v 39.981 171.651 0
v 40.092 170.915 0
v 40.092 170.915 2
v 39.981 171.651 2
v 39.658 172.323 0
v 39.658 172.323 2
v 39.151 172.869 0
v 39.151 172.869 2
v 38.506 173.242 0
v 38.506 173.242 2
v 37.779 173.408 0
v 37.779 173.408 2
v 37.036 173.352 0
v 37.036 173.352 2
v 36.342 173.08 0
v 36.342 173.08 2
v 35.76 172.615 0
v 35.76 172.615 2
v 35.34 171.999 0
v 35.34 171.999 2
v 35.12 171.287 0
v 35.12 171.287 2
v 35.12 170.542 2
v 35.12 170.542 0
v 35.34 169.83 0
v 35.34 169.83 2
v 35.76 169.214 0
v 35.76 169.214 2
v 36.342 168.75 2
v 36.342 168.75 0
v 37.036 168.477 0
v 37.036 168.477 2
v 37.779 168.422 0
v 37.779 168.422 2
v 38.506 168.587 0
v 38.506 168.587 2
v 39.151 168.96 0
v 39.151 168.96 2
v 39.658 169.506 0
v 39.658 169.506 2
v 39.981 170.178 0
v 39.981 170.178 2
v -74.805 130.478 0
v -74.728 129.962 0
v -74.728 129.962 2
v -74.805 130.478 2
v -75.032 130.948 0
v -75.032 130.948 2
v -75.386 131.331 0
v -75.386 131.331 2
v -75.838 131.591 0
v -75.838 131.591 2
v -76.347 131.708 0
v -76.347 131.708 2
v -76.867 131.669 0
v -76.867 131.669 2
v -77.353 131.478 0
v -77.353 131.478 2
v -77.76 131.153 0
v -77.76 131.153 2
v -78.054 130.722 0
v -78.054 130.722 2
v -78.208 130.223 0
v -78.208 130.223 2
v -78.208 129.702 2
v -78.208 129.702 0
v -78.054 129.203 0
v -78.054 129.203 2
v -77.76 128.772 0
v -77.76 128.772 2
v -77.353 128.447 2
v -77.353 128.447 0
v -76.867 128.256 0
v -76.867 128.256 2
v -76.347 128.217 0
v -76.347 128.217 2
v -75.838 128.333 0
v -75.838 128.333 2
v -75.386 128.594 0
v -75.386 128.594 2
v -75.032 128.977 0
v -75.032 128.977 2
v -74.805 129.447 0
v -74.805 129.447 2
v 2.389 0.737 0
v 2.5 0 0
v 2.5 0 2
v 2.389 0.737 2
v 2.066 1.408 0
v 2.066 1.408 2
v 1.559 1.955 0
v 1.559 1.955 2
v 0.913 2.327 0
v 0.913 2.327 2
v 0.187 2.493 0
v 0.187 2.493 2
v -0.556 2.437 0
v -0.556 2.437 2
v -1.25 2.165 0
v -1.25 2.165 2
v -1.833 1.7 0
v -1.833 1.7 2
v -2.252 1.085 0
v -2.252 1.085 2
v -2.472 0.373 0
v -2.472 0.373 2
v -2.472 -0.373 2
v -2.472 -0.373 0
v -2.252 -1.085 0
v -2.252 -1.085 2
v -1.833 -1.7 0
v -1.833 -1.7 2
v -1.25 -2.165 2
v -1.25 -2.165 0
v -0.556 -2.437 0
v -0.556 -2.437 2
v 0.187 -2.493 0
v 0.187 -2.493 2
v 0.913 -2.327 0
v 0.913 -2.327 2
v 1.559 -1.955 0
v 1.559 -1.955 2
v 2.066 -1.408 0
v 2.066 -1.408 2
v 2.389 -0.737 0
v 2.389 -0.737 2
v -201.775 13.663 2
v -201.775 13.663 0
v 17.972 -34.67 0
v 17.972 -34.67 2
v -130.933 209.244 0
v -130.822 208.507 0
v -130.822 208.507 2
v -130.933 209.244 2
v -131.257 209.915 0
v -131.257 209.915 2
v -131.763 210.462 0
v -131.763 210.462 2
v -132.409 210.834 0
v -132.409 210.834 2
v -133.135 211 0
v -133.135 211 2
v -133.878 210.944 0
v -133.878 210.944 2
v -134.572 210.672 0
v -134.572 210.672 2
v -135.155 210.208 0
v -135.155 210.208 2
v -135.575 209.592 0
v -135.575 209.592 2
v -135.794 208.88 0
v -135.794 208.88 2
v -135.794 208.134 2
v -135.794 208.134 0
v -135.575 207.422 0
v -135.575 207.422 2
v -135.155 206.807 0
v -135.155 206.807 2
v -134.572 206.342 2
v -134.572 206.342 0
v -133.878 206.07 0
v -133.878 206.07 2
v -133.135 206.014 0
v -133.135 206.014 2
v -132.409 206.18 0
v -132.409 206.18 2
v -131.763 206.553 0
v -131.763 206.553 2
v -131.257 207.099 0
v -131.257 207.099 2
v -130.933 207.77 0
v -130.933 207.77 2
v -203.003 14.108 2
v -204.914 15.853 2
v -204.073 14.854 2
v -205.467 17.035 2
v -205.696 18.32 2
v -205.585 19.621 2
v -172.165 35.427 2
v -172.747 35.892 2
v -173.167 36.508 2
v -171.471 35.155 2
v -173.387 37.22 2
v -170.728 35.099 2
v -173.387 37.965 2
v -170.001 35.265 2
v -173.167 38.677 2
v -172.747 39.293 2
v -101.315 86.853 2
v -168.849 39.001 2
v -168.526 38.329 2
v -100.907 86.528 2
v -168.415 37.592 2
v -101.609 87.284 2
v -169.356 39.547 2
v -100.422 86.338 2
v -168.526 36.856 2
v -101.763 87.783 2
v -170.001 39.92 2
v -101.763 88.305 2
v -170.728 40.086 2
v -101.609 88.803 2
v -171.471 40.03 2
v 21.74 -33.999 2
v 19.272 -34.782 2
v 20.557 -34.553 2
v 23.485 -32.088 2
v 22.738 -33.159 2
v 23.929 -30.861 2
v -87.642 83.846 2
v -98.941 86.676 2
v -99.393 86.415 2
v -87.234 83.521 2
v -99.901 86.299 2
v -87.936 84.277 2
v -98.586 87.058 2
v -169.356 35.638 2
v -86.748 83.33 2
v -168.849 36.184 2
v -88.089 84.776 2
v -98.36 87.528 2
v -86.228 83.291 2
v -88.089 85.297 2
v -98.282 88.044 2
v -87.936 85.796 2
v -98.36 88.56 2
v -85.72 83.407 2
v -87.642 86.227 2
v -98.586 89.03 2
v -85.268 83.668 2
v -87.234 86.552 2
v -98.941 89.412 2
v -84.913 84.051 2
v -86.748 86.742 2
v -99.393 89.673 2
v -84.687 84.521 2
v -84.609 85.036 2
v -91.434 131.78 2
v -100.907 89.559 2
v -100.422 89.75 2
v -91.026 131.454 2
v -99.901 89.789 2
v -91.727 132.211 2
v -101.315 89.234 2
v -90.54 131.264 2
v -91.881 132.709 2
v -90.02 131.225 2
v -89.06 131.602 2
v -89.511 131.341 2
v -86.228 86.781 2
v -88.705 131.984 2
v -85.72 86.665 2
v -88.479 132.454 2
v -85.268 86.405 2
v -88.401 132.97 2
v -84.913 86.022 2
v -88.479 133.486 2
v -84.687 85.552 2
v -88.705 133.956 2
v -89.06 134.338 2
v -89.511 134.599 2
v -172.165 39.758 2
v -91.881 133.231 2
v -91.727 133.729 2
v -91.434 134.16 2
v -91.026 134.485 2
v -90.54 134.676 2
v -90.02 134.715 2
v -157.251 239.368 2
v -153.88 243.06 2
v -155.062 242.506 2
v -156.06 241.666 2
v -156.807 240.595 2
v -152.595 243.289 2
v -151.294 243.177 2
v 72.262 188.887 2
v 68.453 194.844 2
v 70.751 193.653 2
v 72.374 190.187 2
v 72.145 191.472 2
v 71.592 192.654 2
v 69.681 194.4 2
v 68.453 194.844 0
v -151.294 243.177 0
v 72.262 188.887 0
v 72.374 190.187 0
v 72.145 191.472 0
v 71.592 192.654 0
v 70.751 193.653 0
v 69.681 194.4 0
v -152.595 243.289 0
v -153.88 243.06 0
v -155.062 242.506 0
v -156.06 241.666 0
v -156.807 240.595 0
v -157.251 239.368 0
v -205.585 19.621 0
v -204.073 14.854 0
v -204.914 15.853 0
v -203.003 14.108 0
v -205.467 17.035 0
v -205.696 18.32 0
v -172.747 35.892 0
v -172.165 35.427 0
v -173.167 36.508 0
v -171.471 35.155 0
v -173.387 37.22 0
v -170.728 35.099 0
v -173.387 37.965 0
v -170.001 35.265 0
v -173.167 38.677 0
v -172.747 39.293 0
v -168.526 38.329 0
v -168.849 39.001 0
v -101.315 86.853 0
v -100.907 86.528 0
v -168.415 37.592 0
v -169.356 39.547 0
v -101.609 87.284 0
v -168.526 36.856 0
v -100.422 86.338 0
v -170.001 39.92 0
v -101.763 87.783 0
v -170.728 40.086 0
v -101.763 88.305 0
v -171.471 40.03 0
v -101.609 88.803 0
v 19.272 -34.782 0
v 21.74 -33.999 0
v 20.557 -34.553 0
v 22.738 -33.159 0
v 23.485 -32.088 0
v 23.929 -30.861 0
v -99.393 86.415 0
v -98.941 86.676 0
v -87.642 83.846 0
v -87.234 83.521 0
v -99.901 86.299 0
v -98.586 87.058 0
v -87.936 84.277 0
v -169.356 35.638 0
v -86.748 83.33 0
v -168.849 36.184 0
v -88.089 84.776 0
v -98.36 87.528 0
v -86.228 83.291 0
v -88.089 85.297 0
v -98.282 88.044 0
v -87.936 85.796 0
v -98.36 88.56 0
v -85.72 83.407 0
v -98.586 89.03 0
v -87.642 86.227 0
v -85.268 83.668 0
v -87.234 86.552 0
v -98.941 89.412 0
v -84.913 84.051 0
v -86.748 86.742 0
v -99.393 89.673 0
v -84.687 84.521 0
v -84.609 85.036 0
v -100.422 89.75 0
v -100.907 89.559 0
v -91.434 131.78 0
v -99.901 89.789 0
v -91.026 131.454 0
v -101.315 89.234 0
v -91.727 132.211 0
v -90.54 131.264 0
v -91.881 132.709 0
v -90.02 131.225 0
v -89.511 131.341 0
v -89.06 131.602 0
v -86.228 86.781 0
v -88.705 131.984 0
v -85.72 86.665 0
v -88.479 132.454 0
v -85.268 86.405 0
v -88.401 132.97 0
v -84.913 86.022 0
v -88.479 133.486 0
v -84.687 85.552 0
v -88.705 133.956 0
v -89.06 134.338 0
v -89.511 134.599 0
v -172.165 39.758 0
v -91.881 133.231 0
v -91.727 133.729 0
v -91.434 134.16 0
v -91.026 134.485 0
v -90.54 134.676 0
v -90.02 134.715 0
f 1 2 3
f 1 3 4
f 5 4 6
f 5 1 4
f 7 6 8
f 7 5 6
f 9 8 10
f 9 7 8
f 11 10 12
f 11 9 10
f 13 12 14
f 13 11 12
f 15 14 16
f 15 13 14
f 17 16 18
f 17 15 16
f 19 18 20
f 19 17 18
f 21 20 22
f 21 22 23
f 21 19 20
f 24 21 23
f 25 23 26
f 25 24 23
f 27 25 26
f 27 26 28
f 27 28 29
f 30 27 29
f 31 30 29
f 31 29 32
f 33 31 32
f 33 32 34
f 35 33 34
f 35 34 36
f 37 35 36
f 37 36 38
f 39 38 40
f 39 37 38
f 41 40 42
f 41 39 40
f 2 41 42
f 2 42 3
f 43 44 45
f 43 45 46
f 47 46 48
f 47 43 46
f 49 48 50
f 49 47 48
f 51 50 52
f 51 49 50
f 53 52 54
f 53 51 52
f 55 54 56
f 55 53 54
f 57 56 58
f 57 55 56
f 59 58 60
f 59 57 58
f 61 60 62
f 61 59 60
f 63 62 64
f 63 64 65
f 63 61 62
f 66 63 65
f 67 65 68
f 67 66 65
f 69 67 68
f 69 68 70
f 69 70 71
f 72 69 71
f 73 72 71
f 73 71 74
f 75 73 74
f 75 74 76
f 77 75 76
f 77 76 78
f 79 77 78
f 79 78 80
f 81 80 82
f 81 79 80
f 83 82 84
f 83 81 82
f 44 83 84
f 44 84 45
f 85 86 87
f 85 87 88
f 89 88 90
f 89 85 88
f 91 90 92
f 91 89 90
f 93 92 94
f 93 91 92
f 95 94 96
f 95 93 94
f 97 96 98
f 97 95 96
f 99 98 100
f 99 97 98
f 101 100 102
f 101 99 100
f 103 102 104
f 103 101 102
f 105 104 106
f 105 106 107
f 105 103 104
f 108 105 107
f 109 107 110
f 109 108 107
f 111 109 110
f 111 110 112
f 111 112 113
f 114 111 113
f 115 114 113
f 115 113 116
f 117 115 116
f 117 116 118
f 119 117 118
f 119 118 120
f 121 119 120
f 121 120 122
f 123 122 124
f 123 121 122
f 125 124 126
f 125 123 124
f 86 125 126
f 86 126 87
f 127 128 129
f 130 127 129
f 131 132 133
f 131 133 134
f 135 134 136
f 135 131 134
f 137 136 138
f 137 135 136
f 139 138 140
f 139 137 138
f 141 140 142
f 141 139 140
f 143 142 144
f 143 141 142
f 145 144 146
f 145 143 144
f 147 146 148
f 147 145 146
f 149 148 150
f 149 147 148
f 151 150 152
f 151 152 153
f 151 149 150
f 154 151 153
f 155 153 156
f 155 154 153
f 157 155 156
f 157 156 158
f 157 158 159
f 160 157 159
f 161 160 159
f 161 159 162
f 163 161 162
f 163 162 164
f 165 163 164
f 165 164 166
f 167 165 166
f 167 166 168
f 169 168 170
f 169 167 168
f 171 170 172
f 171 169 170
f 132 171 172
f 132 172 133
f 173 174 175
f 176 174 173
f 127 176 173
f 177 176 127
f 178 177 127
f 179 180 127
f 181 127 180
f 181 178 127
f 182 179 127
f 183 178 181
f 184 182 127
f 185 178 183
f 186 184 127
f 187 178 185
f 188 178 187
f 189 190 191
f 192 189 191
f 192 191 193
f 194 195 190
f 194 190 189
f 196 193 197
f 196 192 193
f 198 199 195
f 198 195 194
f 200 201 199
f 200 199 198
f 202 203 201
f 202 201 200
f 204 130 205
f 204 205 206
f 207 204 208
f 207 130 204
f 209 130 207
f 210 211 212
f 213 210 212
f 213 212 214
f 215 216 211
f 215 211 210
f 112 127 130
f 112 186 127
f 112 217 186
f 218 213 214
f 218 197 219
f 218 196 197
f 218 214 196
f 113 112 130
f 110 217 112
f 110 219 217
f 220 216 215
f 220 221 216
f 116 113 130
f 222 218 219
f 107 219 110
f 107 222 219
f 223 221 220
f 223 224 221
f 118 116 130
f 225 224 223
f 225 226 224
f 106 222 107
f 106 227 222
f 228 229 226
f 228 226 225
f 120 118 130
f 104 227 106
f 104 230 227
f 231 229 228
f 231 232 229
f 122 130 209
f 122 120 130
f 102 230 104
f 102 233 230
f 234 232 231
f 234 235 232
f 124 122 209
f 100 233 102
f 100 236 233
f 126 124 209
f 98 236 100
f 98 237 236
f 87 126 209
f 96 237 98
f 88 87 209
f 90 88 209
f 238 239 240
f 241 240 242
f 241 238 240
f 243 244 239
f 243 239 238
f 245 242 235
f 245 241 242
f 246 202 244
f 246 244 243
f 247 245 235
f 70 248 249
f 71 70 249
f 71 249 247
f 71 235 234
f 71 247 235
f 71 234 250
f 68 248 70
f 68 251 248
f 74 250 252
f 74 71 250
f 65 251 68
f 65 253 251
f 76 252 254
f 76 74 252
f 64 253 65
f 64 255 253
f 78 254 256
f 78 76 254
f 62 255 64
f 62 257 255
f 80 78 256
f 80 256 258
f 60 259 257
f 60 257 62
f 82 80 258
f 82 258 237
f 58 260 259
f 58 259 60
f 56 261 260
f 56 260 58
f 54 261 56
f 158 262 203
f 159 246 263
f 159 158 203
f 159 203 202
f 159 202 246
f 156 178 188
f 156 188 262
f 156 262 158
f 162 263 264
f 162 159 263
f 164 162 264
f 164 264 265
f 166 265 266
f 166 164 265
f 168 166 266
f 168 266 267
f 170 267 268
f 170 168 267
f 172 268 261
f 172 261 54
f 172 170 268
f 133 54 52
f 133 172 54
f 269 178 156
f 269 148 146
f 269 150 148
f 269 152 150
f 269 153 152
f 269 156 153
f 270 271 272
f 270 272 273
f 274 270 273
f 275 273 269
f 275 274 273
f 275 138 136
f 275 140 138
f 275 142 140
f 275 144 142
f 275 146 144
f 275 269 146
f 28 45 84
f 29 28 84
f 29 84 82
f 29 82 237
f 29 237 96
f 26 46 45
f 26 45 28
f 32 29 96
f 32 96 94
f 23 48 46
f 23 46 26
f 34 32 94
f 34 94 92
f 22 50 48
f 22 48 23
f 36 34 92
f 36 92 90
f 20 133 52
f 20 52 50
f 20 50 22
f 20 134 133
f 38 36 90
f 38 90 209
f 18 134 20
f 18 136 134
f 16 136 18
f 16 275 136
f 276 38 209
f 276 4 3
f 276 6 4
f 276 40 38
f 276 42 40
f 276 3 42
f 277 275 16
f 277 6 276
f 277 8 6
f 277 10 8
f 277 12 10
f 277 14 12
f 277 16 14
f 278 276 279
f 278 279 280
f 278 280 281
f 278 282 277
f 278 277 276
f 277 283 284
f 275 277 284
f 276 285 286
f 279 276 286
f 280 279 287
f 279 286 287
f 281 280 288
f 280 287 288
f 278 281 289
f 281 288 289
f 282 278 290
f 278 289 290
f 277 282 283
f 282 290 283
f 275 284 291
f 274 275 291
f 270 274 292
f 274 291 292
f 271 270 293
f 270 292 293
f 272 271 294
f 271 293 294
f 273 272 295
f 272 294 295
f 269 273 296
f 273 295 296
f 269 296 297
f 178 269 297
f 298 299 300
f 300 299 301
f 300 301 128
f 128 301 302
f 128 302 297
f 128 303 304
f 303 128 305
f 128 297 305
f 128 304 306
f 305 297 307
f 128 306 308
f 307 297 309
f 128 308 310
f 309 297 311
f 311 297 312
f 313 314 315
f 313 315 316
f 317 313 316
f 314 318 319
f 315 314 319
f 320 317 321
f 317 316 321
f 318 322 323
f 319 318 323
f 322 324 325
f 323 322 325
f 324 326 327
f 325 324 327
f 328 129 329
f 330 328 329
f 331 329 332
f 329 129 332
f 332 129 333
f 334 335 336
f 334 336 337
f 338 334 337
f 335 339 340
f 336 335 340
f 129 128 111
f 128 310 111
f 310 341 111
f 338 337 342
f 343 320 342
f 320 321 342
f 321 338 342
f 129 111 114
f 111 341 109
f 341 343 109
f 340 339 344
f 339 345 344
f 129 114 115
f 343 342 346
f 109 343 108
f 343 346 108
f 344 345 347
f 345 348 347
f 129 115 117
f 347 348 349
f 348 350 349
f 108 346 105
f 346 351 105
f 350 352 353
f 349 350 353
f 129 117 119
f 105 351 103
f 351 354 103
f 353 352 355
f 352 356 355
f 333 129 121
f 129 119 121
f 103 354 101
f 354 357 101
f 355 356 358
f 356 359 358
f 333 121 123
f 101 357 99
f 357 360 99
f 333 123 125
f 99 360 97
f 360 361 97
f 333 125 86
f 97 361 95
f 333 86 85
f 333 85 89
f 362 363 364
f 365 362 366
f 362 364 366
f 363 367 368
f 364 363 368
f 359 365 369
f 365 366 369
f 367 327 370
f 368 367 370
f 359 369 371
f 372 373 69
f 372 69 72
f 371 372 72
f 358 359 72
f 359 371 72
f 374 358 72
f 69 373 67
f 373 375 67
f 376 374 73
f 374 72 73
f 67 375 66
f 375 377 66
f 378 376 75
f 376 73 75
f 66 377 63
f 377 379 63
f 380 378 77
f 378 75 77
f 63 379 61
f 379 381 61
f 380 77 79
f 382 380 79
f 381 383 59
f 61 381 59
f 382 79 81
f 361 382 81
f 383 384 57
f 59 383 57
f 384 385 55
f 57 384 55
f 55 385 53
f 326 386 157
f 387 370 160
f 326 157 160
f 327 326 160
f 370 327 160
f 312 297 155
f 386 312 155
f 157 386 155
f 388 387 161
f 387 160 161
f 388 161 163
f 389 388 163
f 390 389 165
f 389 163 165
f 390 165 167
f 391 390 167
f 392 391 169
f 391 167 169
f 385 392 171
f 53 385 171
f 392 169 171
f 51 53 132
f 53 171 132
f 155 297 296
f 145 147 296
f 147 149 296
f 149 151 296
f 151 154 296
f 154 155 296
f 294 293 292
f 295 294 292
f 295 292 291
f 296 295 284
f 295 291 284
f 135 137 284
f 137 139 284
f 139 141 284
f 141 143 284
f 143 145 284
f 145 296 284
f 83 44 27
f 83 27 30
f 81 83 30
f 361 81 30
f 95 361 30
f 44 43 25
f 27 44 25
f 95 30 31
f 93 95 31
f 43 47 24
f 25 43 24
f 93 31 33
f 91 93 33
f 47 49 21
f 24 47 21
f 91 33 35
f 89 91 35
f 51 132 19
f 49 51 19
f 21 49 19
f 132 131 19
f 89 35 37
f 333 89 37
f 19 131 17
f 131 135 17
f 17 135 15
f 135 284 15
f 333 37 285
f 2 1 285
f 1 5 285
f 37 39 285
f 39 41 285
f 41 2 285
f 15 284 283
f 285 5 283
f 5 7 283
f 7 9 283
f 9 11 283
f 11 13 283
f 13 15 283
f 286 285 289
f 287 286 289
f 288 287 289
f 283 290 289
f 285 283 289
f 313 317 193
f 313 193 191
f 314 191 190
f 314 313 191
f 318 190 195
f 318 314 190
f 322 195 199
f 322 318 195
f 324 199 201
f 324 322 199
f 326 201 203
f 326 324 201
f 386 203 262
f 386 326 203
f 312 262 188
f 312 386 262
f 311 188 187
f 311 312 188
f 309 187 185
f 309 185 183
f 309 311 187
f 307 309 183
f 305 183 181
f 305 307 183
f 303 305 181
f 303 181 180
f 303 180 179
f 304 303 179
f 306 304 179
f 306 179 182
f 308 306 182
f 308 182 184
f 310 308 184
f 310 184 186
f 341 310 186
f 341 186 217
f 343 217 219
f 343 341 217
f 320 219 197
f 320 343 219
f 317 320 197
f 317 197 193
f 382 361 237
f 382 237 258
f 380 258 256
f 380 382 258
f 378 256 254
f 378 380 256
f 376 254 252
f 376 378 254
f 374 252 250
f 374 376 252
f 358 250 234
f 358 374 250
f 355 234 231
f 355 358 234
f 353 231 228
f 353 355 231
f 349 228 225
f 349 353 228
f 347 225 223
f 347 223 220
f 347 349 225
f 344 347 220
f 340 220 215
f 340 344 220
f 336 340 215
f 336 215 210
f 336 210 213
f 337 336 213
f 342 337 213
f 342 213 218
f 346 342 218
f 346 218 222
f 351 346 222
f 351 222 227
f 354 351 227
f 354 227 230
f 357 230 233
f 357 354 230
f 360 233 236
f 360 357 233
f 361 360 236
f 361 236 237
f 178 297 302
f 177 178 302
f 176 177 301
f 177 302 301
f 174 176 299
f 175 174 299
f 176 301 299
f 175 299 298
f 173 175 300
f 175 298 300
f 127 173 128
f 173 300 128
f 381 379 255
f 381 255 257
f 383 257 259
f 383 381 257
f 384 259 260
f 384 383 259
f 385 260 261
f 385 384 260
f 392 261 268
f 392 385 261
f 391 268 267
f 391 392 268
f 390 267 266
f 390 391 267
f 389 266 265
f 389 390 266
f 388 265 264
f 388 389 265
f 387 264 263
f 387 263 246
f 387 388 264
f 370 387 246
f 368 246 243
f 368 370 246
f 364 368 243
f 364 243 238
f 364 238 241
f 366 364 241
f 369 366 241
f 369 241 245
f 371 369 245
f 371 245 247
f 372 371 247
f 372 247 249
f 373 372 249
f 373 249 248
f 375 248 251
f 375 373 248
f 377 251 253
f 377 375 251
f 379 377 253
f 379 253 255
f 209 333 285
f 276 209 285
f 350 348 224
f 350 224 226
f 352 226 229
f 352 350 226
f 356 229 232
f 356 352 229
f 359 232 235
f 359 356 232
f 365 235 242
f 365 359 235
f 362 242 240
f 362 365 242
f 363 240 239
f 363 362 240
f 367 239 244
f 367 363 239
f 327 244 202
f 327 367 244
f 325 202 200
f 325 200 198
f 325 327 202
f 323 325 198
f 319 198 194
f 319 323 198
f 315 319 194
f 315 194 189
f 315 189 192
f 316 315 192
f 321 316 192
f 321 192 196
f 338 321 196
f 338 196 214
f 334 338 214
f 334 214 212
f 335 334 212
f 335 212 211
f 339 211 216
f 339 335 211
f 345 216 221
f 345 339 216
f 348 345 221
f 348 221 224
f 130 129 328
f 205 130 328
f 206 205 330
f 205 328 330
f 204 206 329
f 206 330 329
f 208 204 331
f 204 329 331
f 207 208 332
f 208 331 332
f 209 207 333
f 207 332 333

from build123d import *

# Parameters (mm, degrees)
ESQUISSE1_R        = 2.5
ESQUISSE1_R_2      = 1.75
BOSS_EXTRU_1_DEPTH = 2


with BuildPart() as part:
    # Esquisse1 → Boss.-Extru.1 (new body)
    with BuildSketch(Plane.XY):
        with BuildLine():
            Line((-201.77541219, 13.663200047), (17.971945957, -34.670003728))
            ThreePointArc((17.971945957, -34.670003728), (21.739530729, -33.99920873), (23.929291778, -30.860800298))
            Line((23.929291778, -30.860800298), (72.262495553, 188.88655785))
            ThreePointArc((72.262495553, 188.88655785), (71.591700555, 192.654142622), (68.453292123, 194.843903671))
            Line((68.453292123, 194.843903671), (-151.294066025, 243.177107446))
            ThreePointArc((-151.294066025, 243.177107446), (-155.061650796, 242.506312448), (-157.251411845, 239.367904015))
            Line((-157.251411845, 239.367904015), (-205.584615621, 19.620545868))
            ThreePointArc((-205.584615621, 19.620545868), (-204.913820623, 15.852961096), (-201.77541219, 13.663200047))
        make_face()
        with Locations((-133.322120067, 208.507103718)):
            Circle(ESQUISSE1_R, mode=Mode.SUBTRACT)
        with Locations((-170.914611893, 37.592491825)):
            Circle(ESQUISSE1_R, mode=Mode.SUBTRACT)
        Circle(ESQUISSE1_R, mode=Mode.SUBTRACT)
        with Locations((-100.0322124, 88.043731079)):
            Circle(ESQUISSE1_R_2, mode=Mode.SUBTRACT)
        with Locations((37.592491825, 170.914611893)):
            Circle(ESQUISSE1_R, mode=Mode.SUBTRACT)
        with Locations((-86.359043449, 85.036331733)):
            Circle(ESQUISSE1_R_2, mode=Mode.SUBTRACT)
        with Locations((-76.477588455, 129.962458287)):
            Circle(ESQUISSE1_R_2, mode=Mode.SUBTRACT)
        with Locations((-90.150757406, 132.969857633)):
            Circle(ESQUISSE1_R_2, mode=Mode.SUBTRACT)
    extrude(amount=BOSS_EXTRU_1_DEPTH)


solid = part.part
